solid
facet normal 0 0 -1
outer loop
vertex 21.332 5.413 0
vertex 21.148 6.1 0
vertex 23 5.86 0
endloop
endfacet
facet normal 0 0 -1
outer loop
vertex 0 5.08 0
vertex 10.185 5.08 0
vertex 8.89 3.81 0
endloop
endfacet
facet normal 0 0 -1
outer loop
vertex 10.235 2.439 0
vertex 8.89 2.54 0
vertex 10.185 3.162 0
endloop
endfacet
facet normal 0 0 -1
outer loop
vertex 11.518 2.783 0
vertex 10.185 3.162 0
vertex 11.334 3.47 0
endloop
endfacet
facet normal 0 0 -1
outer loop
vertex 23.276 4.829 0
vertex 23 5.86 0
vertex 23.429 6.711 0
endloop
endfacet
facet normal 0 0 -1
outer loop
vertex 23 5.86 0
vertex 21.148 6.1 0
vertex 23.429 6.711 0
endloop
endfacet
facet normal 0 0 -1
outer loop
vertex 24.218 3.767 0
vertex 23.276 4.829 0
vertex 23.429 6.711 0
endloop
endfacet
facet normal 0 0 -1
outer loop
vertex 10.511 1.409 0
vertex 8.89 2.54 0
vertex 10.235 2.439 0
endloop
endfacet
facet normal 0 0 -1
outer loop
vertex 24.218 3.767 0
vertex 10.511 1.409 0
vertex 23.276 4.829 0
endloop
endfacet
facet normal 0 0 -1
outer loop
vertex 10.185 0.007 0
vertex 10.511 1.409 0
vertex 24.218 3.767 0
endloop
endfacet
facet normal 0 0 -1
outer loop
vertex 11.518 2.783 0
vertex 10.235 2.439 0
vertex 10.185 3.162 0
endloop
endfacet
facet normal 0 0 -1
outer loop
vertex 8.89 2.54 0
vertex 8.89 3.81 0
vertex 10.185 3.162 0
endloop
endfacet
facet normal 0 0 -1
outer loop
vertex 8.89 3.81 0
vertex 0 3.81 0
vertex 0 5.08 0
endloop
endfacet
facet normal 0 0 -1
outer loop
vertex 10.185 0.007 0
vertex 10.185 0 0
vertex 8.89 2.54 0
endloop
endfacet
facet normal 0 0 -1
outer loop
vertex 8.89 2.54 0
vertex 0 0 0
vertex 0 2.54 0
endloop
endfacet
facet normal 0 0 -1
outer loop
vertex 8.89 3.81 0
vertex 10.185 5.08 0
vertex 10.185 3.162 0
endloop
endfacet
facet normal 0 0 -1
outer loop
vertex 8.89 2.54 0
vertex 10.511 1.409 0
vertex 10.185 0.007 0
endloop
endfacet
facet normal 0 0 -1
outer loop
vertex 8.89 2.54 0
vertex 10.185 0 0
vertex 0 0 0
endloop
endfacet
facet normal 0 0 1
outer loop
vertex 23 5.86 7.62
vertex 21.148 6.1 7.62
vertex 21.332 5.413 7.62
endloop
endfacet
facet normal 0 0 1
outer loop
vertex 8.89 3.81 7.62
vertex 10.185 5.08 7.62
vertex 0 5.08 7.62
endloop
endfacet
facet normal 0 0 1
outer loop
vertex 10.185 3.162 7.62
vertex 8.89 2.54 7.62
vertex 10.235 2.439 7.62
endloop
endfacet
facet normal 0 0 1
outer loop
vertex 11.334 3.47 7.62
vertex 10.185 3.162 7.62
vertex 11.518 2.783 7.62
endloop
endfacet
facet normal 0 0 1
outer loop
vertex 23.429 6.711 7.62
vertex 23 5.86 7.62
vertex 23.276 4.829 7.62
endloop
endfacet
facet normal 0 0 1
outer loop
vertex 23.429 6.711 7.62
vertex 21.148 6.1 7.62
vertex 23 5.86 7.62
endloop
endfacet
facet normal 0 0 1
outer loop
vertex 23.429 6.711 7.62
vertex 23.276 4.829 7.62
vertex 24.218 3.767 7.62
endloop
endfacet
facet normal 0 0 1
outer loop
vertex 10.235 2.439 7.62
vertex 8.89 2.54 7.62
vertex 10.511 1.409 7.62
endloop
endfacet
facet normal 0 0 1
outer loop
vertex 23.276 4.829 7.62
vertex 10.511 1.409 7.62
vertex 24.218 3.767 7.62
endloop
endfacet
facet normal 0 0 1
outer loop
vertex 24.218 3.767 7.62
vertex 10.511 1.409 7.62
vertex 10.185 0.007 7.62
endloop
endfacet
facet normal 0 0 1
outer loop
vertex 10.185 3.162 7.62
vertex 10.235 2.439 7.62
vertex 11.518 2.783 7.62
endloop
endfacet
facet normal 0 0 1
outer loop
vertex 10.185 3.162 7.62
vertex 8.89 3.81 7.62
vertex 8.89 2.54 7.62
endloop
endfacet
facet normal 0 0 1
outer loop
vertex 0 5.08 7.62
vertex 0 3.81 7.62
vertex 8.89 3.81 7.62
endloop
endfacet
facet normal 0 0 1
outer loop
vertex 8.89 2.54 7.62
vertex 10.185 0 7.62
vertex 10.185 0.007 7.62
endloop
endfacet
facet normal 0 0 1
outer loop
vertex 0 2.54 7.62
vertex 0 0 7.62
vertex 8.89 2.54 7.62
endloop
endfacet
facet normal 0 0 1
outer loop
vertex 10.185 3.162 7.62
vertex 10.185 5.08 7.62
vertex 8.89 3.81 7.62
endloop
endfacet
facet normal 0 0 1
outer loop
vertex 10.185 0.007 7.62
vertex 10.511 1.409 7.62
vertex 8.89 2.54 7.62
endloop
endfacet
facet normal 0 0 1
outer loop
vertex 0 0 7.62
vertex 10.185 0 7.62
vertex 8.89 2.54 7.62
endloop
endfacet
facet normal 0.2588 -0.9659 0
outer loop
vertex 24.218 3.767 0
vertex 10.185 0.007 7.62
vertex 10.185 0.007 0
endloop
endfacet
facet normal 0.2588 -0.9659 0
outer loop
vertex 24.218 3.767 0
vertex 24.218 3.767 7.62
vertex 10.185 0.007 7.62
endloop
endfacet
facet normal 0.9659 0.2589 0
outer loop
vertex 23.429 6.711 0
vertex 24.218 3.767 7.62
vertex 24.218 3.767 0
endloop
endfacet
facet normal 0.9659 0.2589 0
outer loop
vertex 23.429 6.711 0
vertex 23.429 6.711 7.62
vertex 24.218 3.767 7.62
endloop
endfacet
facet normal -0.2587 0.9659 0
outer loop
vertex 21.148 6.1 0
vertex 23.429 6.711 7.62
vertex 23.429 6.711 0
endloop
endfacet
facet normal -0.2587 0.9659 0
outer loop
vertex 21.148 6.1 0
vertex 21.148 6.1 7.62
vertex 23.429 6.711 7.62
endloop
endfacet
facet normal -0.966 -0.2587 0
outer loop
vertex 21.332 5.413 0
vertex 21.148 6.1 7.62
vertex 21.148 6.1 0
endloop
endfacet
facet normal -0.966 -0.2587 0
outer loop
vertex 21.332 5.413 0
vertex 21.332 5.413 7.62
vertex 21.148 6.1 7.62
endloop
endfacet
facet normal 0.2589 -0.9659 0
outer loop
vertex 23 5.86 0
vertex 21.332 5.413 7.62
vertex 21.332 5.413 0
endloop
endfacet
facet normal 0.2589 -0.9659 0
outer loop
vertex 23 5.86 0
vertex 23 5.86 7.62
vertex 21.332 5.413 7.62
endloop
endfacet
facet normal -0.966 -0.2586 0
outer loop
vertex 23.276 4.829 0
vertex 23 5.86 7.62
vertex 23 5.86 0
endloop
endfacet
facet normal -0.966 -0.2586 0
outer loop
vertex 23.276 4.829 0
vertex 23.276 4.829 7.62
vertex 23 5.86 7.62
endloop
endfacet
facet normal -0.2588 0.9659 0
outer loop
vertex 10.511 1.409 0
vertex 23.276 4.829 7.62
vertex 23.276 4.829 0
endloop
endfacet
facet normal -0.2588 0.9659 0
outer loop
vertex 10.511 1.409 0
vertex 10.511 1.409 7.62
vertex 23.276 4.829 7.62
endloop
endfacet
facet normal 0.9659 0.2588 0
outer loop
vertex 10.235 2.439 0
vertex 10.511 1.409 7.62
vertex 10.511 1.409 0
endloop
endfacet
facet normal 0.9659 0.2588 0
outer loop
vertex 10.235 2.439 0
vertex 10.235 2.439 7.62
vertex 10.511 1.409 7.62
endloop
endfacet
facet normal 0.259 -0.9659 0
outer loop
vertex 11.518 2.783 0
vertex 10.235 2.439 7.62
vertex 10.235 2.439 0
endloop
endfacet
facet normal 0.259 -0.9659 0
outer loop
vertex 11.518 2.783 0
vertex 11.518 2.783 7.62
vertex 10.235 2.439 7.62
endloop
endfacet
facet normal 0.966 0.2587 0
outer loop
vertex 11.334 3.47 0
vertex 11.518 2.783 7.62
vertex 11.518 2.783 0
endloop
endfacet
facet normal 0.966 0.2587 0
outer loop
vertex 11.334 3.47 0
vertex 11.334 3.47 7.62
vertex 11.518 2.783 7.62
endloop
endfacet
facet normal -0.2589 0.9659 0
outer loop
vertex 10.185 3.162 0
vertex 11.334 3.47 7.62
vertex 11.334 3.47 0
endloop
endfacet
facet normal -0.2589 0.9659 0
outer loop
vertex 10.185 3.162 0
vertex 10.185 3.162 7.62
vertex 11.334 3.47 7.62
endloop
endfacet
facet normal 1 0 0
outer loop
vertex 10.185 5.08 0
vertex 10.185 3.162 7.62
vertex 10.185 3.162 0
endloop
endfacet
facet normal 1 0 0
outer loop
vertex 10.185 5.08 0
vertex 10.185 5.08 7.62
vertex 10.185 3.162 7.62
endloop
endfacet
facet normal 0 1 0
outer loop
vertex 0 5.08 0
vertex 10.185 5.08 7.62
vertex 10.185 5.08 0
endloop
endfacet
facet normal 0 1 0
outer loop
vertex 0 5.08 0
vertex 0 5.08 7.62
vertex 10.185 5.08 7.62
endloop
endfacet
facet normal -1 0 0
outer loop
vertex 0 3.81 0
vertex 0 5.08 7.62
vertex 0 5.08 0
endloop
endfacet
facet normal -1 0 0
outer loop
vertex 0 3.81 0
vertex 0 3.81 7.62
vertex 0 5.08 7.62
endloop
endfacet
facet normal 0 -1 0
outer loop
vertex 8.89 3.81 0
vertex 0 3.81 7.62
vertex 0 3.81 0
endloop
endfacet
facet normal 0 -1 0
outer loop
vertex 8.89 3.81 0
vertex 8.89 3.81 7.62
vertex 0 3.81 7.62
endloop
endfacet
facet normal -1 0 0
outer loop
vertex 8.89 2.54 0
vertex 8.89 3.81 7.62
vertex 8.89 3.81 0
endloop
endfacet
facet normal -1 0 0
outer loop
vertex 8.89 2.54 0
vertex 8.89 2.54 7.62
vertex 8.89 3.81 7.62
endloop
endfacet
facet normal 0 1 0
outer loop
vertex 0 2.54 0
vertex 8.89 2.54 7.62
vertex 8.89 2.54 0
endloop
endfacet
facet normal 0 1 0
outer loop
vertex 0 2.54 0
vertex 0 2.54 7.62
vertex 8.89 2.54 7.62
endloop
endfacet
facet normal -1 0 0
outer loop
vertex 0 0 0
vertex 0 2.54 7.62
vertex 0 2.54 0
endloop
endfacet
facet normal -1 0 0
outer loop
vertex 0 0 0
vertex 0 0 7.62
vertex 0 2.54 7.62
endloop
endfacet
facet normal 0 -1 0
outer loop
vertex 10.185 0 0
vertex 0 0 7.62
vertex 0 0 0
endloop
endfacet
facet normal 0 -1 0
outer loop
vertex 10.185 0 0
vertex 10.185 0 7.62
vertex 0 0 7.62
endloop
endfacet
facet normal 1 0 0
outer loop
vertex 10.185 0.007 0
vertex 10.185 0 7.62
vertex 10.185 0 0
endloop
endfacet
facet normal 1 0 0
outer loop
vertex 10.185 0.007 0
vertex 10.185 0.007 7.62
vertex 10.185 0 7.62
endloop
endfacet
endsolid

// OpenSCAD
// file: ../models/model_ws2812strip.scad
module model_ws2812strip(numleds = 1)
{
    for (ii = [0:1:numleds-1]) {
        echo(ii);
        translate([ii * 400, 0, 0]) {
        // Substrate
        if (modelcolor) color("white")
        linear_extrude(20)
        square([400, 473]);

        // LED
        if (modelcolor) color("beige")
        translate([100, 100, 19])
        linear_extrude(51)
        square([200, 200]);

        // Resistor
        if (modelcolor) color("tan")
        translate([150, 350, 19])
        linear_extrude(50)
        square([100, 30]);
        }

        if (modelcolor) {
            // Contacts
            color("gold")
            translate([0, 0, 20])
            linear_extrude(1) {
                for (ii=[120,240,360]) {
                    translate([360, ii, 0])
                    hull() {
                        circle(80/2);
                        translate([0, -40, 0])
                        square([40, 80]);
                    }
                }
                for (ii=[120,240,360]) {
                    translate([40, ii, 0])
                    rotate([0, 0, 180])
                    hull() {
                        circle(80/2);
                        translate([0, -40, 0])
                        square([40, 80]);
                    }
                }
            }

            // Outline
            color("black")
            translate([0, 0, 20])
            linear_extrude(1) 
            difference() {
                square([400, 473]);
                translate([5, 5, 0])
                square([390, 463]);
            }
        }
    }
}
// main file
ViewScale = [0.0254, 0.0254, 0.0254];

include <../models/model_ws2812strip.scad>

model_lip = function() [50,350];
modelcolor = 1;

module ws2812strip_insert()
{
    difference() {
        projection() {
            translate([473, 0, 0])
            rotate([0, 270, 90])
            scale([1.0, 1.1, 2.0])
            model_ws2812strip();
        }
    }
}

module ws2812clip()
{
    difference() {
        square([401, 200]);
        translate([0, 150, 0])
        rotate([0, 0, -90])
        square(model_lip());
    }
    translate([400, 0, 0])
    rotate([0, 0, 15])
    difference() {
        square([573, 120]);
        translate([75, 50, 0])
        scale([1.0, -1.0, 1.0])
        ws2812strip_insert();
        translate([80, 70, 0])
        square([400, 50]);
    }
}

module forViewing()
{
//    model_ws2812strip();
    ws2812clip();
}

module forPrinting()
{
    linear_extrude(300)
    ws2812clip();
}

scale(ViewScale)
{
    forPrinting();
//    forViewing();
}
